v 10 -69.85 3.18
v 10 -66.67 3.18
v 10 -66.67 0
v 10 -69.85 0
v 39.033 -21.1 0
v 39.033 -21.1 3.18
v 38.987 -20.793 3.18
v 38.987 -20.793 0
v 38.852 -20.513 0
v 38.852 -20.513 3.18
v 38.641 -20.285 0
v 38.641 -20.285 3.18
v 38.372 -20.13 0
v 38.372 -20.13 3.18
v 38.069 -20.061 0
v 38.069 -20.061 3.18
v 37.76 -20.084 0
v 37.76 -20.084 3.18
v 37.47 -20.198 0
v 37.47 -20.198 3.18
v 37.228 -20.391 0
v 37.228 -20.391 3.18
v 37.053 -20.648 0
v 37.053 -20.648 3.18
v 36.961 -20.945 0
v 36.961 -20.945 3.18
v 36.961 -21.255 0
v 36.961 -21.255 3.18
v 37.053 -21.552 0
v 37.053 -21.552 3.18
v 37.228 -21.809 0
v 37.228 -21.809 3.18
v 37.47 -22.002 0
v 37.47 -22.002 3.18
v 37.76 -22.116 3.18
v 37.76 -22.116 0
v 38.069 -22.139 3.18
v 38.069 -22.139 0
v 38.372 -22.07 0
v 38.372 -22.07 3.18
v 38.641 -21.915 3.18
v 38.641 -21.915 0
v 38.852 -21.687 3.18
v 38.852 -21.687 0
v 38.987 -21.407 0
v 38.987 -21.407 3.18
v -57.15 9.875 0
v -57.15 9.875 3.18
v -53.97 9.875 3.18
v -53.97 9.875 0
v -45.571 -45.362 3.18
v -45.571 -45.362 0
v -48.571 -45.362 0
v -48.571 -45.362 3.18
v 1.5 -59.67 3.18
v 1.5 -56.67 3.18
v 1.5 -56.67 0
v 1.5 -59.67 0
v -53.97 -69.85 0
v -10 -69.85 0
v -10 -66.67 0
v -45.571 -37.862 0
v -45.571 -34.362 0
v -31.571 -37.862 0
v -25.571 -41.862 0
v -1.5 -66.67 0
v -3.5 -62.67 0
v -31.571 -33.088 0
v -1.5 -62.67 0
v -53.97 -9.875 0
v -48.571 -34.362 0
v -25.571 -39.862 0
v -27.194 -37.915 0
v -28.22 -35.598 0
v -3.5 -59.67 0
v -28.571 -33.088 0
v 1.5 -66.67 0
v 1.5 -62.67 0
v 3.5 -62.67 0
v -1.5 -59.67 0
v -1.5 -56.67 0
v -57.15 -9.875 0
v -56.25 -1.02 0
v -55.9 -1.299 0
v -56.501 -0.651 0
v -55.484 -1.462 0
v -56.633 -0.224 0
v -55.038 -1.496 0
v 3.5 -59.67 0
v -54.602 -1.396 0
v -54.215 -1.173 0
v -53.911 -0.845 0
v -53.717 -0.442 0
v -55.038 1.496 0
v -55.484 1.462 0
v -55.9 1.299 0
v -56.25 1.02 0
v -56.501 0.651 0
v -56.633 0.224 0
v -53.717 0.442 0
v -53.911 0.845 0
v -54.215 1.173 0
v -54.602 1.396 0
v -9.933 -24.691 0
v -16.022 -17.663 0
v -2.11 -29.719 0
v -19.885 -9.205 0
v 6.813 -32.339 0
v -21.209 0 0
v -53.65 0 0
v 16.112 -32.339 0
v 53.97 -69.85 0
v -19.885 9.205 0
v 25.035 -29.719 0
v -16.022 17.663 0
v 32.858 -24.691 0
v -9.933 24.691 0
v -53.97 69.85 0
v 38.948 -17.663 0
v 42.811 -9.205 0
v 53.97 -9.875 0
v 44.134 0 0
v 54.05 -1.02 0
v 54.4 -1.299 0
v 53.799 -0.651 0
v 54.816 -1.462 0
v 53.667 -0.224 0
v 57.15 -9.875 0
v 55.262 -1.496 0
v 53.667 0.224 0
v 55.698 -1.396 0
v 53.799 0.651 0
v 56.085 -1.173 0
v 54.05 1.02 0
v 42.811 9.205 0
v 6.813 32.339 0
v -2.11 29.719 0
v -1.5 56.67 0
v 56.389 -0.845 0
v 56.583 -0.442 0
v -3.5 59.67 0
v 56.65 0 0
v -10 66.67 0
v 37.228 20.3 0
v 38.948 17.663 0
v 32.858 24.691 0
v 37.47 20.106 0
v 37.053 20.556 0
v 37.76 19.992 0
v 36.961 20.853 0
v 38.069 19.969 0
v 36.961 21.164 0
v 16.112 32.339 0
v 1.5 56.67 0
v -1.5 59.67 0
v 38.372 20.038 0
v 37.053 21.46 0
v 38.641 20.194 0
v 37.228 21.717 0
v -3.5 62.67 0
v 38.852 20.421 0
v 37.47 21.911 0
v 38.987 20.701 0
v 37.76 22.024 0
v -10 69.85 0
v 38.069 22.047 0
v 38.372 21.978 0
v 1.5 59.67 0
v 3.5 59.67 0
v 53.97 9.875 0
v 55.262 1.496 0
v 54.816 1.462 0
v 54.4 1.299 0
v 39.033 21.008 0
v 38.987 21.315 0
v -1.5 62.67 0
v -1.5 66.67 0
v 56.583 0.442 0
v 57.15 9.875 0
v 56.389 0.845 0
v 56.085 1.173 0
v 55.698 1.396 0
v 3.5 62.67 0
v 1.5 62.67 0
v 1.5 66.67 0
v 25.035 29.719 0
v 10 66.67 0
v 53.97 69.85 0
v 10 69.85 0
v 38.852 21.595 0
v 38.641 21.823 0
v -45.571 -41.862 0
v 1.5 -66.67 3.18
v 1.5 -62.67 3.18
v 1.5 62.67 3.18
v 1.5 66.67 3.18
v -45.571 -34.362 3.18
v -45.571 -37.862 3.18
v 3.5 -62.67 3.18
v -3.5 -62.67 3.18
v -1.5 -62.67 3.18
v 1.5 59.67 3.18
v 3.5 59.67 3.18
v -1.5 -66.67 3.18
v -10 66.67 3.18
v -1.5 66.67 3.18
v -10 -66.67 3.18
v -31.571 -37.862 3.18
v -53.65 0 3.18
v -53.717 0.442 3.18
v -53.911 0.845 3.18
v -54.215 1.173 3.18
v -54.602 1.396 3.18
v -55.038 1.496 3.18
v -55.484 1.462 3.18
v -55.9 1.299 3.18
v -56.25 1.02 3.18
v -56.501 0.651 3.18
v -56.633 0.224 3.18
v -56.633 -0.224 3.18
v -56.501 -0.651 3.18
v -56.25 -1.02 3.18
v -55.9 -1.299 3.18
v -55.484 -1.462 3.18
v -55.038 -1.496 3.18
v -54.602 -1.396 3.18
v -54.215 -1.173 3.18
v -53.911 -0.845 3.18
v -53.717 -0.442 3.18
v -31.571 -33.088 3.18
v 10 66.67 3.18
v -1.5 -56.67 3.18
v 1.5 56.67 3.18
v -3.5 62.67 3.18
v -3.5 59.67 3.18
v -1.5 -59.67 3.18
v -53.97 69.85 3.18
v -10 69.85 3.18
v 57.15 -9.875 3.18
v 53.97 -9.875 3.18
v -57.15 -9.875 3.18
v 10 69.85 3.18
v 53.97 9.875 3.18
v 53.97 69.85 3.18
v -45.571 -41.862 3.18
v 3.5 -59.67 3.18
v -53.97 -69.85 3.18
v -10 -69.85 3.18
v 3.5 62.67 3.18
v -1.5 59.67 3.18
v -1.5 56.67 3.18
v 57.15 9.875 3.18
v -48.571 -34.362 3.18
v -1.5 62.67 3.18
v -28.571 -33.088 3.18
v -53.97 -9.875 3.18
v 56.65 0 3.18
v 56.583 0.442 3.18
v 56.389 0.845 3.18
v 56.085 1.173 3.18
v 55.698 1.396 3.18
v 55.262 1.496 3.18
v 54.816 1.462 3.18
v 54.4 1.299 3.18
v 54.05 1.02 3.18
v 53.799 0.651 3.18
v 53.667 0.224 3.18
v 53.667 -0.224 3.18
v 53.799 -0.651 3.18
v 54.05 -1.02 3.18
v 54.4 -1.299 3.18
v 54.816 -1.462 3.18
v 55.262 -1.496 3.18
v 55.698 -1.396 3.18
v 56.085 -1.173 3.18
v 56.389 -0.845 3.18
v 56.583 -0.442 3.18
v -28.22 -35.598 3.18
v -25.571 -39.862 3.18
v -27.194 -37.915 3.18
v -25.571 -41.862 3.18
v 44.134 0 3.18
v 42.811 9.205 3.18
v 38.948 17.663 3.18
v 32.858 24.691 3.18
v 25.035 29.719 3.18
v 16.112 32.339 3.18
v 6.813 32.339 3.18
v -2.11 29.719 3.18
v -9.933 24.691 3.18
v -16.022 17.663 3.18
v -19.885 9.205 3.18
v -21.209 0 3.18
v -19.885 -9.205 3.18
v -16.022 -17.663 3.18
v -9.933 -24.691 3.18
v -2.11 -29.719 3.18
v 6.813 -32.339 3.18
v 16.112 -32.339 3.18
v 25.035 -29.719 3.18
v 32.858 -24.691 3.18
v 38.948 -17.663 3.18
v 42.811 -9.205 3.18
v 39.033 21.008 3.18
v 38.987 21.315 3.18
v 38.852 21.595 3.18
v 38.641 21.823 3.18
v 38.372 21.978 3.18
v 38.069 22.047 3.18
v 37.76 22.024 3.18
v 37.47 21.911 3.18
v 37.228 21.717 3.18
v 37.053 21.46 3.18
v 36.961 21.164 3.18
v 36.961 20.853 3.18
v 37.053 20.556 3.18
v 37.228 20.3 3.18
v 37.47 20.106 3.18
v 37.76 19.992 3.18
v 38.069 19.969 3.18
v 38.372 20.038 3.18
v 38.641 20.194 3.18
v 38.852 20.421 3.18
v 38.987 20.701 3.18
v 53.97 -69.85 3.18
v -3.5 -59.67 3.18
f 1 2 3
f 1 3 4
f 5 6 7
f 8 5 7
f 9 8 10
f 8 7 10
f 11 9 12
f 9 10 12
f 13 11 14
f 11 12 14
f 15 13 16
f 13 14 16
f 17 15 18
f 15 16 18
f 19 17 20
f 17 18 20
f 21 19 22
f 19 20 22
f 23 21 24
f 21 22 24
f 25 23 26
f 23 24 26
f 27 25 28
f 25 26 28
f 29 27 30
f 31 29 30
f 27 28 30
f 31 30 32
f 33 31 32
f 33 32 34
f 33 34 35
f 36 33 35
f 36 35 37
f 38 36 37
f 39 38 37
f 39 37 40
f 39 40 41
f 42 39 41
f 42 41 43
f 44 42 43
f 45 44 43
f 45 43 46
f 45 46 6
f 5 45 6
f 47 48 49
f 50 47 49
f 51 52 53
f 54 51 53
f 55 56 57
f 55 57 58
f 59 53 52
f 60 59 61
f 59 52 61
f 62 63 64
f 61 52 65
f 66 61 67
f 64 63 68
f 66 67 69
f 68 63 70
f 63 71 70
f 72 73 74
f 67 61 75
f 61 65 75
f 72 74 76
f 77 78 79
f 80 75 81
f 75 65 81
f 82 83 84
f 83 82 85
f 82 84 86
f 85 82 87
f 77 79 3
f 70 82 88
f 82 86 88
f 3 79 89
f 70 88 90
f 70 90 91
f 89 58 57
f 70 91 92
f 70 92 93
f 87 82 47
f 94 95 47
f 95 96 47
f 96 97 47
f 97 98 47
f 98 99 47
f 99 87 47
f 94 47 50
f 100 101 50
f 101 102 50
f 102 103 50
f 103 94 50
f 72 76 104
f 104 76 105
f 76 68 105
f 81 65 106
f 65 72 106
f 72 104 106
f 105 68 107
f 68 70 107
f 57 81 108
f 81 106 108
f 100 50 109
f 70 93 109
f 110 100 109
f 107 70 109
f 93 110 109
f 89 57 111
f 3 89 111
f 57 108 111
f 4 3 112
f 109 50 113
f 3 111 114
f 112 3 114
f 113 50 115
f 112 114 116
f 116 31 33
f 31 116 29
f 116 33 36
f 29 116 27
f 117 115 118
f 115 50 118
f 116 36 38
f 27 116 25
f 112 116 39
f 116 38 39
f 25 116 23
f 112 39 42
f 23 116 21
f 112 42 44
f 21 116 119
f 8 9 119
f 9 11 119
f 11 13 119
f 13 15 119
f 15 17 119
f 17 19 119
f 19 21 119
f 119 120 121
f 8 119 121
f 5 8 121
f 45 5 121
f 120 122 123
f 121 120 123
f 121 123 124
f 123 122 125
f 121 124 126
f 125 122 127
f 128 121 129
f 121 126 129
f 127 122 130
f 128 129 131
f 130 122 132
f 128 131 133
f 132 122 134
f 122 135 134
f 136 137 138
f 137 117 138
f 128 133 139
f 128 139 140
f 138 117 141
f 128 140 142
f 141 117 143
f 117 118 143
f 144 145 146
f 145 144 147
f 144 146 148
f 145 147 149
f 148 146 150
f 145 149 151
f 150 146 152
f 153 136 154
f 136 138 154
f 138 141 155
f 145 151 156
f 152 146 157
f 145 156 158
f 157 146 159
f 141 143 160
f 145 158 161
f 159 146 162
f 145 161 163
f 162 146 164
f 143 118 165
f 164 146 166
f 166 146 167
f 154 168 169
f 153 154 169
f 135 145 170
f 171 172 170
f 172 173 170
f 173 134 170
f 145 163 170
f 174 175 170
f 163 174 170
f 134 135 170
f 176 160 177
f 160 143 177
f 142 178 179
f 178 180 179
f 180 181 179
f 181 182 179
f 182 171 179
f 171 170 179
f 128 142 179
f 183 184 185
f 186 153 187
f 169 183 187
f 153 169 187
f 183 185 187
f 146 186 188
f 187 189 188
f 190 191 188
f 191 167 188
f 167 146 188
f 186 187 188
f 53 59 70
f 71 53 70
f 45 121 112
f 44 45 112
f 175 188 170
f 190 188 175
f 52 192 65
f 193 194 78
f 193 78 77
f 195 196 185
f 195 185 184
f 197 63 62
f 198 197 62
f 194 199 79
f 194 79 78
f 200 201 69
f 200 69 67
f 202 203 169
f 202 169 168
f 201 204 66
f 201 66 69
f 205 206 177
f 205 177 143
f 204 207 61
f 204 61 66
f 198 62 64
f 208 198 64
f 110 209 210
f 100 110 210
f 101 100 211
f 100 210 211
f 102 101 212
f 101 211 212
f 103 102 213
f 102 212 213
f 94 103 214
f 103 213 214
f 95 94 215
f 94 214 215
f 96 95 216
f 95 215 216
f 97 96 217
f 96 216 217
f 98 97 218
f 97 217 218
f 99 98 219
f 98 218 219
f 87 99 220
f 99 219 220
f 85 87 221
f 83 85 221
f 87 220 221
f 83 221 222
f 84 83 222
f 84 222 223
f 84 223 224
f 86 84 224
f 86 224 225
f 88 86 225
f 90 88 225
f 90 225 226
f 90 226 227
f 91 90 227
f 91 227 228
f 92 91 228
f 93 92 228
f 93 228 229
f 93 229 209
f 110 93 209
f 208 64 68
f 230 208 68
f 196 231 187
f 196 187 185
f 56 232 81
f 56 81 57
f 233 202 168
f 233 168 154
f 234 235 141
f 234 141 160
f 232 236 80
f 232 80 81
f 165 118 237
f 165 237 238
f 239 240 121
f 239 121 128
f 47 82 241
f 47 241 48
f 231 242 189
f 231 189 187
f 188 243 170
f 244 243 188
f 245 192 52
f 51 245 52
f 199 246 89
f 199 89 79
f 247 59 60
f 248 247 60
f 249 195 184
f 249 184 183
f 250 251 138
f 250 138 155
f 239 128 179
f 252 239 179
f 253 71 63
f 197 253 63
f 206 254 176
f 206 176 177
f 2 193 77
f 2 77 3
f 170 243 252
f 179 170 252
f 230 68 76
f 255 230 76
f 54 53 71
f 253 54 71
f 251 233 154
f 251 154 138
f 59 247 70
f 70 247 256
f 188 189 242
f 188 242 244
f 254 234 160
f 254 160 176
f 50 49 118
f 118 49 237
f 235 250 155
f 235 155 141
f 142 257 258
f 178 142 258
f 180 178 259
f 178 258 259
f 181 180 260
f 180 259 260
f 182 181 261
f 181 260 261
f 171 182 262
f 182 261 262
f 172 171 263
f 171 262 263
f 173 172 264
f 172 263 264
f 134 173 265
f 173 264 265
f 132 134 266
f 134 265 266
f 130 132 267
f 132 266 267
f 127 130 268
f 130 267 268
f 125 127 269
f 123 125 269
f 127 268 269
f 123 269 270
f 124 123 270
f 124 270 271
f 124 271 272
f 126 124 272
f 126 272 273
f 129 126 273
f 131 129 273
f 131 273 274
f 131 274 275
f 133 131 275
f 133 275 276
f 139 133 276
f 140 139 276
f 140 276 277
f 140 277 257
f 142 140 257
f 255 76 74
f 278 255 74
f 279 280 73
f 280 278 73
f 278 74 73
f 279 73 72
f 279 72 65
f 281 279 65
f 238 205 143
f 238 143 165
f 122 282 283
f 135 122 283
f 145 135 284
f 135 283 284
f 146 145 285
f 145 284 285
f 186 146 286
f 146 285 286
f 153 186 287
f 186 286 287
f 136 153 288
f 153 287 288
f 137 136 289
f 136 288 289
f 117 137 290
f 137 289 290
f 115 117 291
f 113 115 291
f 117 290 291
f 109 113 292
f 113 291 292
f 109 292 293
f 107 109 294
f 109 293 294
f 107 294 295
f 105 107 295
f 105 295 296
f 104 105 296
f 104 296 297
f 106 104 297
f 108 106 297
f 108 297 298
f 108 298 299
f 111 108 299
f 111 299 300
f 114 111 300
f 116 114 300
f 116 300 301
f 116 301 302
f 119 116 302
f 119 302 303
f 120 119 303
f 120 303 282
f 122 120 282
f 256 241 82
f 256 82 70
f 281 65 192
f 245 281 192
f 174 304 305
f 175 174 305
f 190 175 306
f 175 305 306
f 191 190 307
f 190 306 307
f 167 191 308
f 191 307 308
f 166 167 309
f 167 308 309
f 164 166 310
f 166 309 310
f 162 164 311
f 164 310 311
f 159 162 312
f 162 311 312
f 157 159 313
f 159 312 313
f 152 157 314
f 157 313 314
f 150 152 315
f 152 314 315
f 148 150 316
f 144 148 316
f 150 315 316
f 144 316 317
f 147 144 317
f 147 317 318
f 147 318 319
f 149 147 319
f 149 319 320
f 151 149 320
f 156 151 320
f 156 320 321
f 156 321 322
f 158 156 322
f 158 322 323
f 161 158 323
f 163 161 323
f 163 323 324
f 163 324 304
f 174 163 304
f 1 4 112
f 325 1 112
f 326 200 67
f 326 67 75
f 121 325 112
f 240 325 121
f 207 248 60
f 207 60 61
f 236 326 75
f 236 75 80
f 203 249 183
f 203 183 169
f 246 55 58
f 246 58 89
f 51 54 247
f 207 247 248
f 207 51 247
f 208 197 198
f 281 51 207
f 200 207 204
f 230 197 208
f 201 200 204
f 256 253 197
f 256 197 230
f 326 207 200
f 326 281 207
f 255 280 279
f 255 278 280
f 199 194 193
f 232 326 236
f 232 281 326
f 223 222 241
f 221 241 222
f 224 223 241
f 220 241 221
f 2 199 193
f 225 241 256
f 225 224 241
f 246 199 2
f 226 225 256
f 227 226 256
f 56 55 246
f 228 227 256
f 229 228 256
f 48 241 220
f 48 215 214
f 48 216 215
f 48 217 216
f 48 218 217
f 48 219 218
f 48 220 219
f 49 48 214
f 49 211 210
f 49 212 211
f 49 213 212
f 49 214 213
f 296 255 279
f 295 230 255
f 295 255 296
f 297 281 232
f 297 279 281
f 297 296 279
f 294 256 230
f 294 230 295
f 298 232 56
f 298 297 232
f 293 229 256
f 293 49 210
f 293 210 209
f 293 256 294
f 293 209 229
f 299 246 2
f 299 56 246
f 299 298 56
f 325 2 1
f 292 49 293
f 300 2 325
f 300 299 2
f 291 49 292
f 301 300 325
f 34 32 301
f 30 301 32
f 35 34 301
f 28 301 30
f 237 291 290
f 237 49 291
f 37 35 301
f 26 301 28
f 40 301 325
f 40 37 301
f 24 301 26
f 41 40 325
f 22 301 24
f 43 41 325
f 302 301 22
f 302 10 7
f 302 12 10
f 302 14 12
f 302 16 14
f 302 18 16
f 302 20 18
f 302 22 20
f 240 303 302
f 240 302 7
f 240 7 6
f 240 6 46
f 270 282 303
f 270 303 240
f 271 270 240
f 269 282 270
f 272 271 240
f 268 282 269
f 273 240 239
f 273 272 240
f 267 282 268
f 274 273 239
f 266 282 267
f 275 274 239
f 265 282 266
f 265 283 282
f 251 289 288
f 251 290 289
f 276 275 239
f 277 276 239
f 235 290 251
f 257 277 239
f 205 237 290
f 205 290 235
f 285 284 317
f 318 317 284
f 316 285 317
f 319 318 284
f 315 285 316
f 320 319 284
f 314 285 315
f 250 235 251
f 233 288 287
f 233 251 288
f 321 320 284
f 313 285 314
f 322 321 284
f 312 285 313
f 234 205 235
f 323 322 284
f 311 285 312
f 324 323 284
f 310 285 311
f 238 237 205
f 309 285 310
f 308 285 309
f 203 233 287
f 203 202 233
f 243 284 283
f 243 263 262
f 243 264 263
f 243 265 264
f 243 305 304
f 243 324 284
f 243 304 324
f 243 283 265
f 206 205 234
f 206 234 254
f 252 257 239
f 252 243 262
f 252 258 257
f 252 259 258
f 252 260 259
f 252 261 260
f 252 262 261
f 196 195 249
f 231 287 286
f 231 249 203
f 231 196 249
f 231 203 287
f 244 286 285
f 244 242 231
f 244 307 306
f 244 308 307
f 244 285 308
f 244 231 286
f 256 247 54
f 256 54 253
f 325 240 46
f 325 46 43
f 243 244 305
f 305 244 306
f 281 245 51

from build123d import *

# Parameters (mm, degrees)
SKETCH1_W           = 114.3
SKETCH1_H           = 139.7
BOSS_EXTRUDE1_DEPTH = 3.18
SKETCH2_R           = 1.5
SKETCH2_W           = 3.18
SKETCH2_H           = 59.975
CUT_EXTRUDE1_DEPTH  = 91.306463778
CUT_EXTRUDE5_DEPTH  = 12
SKETCH5_R           = 32.671394307
CUT_EXTRUDE6_DEPTH  = 10
SKETCH9_R           = 1.042012373
CUT_EXTRUDE8_DEPTH  = 91.306463778


with BuildPart() as part:
    # Sketch1 → Boss-Extrude1 (new body)
    with BuildSketch(Plane.XY):
        Rectangle(SKETCH1_W, SKETCH1_H)
    extrude(amount=BOSS_EXTRUDE1_DEPTH)

    # Sketch2 → Cut-Extrude1 (cut, through all)
    with BuildSketch(Plane.XY.offset(3.18)):
        with Locations((-55.15, 0)):
            Circle(SKETCH2_R)
        with Locations((55.15, 0)):
            Circle(SKETCH2_R)
        Polygon((-10, 69.85), (10, 69.85), (10, 66.67), (1.5, 66.67), (1.5, 62.67), (3.5, 62.67), (3.5, 59.67), (1.5, 59.67), (1.5, 56.67), (-1.5, 56.67), (-1.5, 59.67), (-3.5, 59.67), (-3.5, 62.67), (-1.5, 62.67), (-1.5, 66.67), (-10, 66.67), align=None)
        Polygon((-10, -69.85), (-10, -66.67), (-1.5, -66.67), (-1.5, -62.67), (-3.5, -62.67), (-3.5, -59.67), (-1.5, -59.67), (-1.5, -56.67), (1.5, -56.67), (1.5, -59.67), (3.5, -59.67), (3.5, -62.67), (1.5, -62.67), (1.5, -66.67), (10, -66.67), (10, -69.85), align=None)
        with Locations((-55.56, 39.8625)):
            Rectangle(SKETCH2_W, SKETCH2_H)
        with Locations((-55.56, -39.8625)):
            Rectangle(SKETCH2_W, SKETCH2_H)
        with Locations((55.56, -39.8625)):
            Rectangle(SKETCH2_W, SKETCH2_H)
        with Locations((55.56, 39.8625)):
            Rectangle(SKETCH2_W, SKETCH2_H)
    extrude(amount=-CUT_EXTRUDE1_DEPTH, mode=Mode.SUBTRACT)

    # Sketch4 → Cut-Extrude5 (cut)
    with BuildSketch(Plane.XY):
        with BuildLine():
            Line((-25.57107609, -41.8625), (-45.57107609, -41.8625))
            Line((-45.57107609, -41.8625), (-45.57107609, -45.3625))
            Line((-45.57107609, -45.3625), (-48.57107609, -45.3625))
            Line((-48.57107609, -45.3625), (-48.57107609, -34.3625))
            Line((-48.57107609, -34.3625), (-45.57107609, -34.3625))
            Line((-45.57107609, -34.3625), (-45.57107609, -37.8625))
            Line((-45.57107609, -37.8625), (-31.57107609, -37.8625))
            Line((-31.57107609, -37.8625), (-31.57107609, -33.087601989))
            Line((-31.57107609, -33.087601989), (-28.57107609, -33.087601989))
            ThreePointArc((-28.57107609, -33.087601989), (-27.787526444, -36.79230316), (-25.57107609, -39.8625))
            Line((-25.57107609, -39.8625), (-25.57107609, -41.8625))
        make_face()
    extrude(amount=CUT_EXTRUDE5_DEPTH, mode=Mode.SUBTRACT)

    # Sketch5 → Cut-Extrude6 (cut)
    with BuildSketch(Plane.XY.offset(3.18)):
        with Locations((11.462576996, 0)):
            Circle(SKETCH5_R)
    extrude(amount=-CUT_EXTRUDE6_DEPTH, mode=Mode.SUBTRACT)

    # Sketch9 → Cut-Extrude8 (cut, through all)
    with BuildSketch(Plane.XY.offset(3.18)):
        with Locations((37.991387583, -21.1)):
            Circle(SKETCH9_R)
        with Locations((37.991387583, 21.008299604)):
            Circle(SKETCH9_R)
    extrude(amount=-CUT_EXTRUDE8_DEPTH, mode=Mode.SUBTRACT)


solid = part.part
